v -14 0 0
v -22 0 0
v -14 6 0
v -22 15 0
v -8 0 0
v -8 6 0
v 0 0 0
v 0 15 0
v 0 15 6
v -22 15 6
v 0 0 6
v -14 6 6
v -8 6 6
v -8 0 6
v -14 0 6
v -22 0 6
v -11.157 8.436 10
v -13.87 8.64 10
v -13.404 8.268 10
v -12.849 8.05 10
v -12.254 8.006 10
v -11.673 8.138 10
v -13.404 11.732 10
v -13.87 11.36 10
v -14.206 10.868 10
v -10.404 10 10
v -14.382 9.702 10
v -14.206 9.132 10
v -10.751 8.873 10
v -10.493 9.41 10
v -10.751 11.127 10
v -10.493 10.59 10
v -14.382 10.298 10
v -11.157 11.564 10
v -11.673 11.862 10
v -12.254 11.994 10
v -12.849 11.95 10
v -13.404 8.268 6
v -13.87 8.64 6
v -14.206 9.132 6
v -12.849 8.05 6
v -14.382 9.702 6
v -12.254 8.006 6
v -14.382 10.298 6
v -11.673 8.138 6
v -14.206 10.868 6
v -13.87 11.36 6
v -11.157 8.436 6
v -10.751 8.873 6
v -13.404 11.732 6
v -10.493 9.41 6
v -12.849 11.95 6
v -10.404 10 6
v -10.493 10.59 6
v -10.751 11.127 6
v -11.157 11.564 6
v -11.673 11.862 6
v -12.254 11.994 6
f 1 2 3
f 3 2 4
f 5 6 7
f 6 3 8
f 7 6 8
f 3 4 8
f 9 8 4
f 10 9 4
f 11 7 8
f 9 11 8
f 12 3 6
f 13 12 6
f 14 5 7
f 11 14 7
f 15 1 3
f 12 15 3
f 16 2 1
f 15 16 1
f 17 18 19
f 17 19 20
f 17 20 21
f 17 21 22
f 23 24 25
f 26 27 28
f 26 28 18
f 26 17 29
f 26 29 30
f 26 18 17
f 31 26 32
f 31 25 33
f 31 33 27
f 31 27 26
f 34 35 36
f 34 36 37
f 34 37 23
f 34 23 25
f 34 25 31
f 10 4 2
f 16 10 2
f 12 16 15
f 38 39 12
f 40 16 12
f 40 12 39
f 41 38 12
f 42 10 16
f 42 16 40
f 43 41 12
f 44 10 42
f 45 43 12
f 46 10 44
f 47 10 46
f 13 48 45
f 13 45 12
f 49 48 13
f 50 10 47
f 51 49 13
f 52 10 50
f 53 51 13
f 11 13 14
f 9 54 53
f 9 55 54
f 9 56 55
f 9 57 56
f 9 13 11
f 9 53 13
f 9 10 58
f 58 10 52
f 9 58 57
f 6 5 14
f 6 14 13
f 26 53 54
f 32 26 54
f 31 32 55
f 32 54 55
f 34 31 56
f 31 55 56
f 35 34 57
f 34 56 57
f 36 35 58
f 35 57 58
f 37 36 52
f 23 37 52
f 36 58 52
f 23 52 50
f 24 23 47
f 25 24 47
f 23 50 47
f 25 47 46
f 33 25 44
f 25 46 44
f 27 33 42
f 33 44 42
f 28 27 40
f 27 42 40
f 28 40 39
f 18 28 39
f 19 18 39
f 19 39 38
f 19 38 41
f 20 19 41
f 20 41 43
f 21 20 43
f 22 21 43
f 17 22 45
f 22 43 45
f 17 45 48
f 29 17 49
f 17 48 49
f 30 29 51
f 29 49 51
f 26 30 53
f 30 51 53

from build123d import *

# Parameters (mm, degrees)
ESQUISSE1_W        = 8
ESQUISSE1_H        = 6
BOSS_EXTRU_1_DEPTH = 6
ESQUISSE2_R        = 2
BOSS_EXTRU_2_DEPTH = 4


with BuildPart() as part:
    # Esquisse1 → Boss.-Extru.1 (new body)
    with BuildSketch(Plane.XY):
        Polygon((-8, 6), (0, 6), (0, 15), (-22, 15), (-22, 6), (-14, 6), align=None)
        with Locations((-4, 3)):
            Rectangle(ESQUISSE1_W, ESQUISSE1_H)
        with Locations((-18, 3)):
            Rectangle(ESQUISSE1_W, ESQUISSE1_H)
    extrude(amount=BOSS_EXTRU_1_DEPTH)

    # Esquisse2 → Boss.-Extru.2 (add)
    with BuildSketch(Plane.XY.offset(6)):
        with Locations((-12.403841621, 10)):
            Circle(ESQUISSE2_R)
    extrude(amount=BOSS_EXTRU_2_DEPTH)


solid = part.part
